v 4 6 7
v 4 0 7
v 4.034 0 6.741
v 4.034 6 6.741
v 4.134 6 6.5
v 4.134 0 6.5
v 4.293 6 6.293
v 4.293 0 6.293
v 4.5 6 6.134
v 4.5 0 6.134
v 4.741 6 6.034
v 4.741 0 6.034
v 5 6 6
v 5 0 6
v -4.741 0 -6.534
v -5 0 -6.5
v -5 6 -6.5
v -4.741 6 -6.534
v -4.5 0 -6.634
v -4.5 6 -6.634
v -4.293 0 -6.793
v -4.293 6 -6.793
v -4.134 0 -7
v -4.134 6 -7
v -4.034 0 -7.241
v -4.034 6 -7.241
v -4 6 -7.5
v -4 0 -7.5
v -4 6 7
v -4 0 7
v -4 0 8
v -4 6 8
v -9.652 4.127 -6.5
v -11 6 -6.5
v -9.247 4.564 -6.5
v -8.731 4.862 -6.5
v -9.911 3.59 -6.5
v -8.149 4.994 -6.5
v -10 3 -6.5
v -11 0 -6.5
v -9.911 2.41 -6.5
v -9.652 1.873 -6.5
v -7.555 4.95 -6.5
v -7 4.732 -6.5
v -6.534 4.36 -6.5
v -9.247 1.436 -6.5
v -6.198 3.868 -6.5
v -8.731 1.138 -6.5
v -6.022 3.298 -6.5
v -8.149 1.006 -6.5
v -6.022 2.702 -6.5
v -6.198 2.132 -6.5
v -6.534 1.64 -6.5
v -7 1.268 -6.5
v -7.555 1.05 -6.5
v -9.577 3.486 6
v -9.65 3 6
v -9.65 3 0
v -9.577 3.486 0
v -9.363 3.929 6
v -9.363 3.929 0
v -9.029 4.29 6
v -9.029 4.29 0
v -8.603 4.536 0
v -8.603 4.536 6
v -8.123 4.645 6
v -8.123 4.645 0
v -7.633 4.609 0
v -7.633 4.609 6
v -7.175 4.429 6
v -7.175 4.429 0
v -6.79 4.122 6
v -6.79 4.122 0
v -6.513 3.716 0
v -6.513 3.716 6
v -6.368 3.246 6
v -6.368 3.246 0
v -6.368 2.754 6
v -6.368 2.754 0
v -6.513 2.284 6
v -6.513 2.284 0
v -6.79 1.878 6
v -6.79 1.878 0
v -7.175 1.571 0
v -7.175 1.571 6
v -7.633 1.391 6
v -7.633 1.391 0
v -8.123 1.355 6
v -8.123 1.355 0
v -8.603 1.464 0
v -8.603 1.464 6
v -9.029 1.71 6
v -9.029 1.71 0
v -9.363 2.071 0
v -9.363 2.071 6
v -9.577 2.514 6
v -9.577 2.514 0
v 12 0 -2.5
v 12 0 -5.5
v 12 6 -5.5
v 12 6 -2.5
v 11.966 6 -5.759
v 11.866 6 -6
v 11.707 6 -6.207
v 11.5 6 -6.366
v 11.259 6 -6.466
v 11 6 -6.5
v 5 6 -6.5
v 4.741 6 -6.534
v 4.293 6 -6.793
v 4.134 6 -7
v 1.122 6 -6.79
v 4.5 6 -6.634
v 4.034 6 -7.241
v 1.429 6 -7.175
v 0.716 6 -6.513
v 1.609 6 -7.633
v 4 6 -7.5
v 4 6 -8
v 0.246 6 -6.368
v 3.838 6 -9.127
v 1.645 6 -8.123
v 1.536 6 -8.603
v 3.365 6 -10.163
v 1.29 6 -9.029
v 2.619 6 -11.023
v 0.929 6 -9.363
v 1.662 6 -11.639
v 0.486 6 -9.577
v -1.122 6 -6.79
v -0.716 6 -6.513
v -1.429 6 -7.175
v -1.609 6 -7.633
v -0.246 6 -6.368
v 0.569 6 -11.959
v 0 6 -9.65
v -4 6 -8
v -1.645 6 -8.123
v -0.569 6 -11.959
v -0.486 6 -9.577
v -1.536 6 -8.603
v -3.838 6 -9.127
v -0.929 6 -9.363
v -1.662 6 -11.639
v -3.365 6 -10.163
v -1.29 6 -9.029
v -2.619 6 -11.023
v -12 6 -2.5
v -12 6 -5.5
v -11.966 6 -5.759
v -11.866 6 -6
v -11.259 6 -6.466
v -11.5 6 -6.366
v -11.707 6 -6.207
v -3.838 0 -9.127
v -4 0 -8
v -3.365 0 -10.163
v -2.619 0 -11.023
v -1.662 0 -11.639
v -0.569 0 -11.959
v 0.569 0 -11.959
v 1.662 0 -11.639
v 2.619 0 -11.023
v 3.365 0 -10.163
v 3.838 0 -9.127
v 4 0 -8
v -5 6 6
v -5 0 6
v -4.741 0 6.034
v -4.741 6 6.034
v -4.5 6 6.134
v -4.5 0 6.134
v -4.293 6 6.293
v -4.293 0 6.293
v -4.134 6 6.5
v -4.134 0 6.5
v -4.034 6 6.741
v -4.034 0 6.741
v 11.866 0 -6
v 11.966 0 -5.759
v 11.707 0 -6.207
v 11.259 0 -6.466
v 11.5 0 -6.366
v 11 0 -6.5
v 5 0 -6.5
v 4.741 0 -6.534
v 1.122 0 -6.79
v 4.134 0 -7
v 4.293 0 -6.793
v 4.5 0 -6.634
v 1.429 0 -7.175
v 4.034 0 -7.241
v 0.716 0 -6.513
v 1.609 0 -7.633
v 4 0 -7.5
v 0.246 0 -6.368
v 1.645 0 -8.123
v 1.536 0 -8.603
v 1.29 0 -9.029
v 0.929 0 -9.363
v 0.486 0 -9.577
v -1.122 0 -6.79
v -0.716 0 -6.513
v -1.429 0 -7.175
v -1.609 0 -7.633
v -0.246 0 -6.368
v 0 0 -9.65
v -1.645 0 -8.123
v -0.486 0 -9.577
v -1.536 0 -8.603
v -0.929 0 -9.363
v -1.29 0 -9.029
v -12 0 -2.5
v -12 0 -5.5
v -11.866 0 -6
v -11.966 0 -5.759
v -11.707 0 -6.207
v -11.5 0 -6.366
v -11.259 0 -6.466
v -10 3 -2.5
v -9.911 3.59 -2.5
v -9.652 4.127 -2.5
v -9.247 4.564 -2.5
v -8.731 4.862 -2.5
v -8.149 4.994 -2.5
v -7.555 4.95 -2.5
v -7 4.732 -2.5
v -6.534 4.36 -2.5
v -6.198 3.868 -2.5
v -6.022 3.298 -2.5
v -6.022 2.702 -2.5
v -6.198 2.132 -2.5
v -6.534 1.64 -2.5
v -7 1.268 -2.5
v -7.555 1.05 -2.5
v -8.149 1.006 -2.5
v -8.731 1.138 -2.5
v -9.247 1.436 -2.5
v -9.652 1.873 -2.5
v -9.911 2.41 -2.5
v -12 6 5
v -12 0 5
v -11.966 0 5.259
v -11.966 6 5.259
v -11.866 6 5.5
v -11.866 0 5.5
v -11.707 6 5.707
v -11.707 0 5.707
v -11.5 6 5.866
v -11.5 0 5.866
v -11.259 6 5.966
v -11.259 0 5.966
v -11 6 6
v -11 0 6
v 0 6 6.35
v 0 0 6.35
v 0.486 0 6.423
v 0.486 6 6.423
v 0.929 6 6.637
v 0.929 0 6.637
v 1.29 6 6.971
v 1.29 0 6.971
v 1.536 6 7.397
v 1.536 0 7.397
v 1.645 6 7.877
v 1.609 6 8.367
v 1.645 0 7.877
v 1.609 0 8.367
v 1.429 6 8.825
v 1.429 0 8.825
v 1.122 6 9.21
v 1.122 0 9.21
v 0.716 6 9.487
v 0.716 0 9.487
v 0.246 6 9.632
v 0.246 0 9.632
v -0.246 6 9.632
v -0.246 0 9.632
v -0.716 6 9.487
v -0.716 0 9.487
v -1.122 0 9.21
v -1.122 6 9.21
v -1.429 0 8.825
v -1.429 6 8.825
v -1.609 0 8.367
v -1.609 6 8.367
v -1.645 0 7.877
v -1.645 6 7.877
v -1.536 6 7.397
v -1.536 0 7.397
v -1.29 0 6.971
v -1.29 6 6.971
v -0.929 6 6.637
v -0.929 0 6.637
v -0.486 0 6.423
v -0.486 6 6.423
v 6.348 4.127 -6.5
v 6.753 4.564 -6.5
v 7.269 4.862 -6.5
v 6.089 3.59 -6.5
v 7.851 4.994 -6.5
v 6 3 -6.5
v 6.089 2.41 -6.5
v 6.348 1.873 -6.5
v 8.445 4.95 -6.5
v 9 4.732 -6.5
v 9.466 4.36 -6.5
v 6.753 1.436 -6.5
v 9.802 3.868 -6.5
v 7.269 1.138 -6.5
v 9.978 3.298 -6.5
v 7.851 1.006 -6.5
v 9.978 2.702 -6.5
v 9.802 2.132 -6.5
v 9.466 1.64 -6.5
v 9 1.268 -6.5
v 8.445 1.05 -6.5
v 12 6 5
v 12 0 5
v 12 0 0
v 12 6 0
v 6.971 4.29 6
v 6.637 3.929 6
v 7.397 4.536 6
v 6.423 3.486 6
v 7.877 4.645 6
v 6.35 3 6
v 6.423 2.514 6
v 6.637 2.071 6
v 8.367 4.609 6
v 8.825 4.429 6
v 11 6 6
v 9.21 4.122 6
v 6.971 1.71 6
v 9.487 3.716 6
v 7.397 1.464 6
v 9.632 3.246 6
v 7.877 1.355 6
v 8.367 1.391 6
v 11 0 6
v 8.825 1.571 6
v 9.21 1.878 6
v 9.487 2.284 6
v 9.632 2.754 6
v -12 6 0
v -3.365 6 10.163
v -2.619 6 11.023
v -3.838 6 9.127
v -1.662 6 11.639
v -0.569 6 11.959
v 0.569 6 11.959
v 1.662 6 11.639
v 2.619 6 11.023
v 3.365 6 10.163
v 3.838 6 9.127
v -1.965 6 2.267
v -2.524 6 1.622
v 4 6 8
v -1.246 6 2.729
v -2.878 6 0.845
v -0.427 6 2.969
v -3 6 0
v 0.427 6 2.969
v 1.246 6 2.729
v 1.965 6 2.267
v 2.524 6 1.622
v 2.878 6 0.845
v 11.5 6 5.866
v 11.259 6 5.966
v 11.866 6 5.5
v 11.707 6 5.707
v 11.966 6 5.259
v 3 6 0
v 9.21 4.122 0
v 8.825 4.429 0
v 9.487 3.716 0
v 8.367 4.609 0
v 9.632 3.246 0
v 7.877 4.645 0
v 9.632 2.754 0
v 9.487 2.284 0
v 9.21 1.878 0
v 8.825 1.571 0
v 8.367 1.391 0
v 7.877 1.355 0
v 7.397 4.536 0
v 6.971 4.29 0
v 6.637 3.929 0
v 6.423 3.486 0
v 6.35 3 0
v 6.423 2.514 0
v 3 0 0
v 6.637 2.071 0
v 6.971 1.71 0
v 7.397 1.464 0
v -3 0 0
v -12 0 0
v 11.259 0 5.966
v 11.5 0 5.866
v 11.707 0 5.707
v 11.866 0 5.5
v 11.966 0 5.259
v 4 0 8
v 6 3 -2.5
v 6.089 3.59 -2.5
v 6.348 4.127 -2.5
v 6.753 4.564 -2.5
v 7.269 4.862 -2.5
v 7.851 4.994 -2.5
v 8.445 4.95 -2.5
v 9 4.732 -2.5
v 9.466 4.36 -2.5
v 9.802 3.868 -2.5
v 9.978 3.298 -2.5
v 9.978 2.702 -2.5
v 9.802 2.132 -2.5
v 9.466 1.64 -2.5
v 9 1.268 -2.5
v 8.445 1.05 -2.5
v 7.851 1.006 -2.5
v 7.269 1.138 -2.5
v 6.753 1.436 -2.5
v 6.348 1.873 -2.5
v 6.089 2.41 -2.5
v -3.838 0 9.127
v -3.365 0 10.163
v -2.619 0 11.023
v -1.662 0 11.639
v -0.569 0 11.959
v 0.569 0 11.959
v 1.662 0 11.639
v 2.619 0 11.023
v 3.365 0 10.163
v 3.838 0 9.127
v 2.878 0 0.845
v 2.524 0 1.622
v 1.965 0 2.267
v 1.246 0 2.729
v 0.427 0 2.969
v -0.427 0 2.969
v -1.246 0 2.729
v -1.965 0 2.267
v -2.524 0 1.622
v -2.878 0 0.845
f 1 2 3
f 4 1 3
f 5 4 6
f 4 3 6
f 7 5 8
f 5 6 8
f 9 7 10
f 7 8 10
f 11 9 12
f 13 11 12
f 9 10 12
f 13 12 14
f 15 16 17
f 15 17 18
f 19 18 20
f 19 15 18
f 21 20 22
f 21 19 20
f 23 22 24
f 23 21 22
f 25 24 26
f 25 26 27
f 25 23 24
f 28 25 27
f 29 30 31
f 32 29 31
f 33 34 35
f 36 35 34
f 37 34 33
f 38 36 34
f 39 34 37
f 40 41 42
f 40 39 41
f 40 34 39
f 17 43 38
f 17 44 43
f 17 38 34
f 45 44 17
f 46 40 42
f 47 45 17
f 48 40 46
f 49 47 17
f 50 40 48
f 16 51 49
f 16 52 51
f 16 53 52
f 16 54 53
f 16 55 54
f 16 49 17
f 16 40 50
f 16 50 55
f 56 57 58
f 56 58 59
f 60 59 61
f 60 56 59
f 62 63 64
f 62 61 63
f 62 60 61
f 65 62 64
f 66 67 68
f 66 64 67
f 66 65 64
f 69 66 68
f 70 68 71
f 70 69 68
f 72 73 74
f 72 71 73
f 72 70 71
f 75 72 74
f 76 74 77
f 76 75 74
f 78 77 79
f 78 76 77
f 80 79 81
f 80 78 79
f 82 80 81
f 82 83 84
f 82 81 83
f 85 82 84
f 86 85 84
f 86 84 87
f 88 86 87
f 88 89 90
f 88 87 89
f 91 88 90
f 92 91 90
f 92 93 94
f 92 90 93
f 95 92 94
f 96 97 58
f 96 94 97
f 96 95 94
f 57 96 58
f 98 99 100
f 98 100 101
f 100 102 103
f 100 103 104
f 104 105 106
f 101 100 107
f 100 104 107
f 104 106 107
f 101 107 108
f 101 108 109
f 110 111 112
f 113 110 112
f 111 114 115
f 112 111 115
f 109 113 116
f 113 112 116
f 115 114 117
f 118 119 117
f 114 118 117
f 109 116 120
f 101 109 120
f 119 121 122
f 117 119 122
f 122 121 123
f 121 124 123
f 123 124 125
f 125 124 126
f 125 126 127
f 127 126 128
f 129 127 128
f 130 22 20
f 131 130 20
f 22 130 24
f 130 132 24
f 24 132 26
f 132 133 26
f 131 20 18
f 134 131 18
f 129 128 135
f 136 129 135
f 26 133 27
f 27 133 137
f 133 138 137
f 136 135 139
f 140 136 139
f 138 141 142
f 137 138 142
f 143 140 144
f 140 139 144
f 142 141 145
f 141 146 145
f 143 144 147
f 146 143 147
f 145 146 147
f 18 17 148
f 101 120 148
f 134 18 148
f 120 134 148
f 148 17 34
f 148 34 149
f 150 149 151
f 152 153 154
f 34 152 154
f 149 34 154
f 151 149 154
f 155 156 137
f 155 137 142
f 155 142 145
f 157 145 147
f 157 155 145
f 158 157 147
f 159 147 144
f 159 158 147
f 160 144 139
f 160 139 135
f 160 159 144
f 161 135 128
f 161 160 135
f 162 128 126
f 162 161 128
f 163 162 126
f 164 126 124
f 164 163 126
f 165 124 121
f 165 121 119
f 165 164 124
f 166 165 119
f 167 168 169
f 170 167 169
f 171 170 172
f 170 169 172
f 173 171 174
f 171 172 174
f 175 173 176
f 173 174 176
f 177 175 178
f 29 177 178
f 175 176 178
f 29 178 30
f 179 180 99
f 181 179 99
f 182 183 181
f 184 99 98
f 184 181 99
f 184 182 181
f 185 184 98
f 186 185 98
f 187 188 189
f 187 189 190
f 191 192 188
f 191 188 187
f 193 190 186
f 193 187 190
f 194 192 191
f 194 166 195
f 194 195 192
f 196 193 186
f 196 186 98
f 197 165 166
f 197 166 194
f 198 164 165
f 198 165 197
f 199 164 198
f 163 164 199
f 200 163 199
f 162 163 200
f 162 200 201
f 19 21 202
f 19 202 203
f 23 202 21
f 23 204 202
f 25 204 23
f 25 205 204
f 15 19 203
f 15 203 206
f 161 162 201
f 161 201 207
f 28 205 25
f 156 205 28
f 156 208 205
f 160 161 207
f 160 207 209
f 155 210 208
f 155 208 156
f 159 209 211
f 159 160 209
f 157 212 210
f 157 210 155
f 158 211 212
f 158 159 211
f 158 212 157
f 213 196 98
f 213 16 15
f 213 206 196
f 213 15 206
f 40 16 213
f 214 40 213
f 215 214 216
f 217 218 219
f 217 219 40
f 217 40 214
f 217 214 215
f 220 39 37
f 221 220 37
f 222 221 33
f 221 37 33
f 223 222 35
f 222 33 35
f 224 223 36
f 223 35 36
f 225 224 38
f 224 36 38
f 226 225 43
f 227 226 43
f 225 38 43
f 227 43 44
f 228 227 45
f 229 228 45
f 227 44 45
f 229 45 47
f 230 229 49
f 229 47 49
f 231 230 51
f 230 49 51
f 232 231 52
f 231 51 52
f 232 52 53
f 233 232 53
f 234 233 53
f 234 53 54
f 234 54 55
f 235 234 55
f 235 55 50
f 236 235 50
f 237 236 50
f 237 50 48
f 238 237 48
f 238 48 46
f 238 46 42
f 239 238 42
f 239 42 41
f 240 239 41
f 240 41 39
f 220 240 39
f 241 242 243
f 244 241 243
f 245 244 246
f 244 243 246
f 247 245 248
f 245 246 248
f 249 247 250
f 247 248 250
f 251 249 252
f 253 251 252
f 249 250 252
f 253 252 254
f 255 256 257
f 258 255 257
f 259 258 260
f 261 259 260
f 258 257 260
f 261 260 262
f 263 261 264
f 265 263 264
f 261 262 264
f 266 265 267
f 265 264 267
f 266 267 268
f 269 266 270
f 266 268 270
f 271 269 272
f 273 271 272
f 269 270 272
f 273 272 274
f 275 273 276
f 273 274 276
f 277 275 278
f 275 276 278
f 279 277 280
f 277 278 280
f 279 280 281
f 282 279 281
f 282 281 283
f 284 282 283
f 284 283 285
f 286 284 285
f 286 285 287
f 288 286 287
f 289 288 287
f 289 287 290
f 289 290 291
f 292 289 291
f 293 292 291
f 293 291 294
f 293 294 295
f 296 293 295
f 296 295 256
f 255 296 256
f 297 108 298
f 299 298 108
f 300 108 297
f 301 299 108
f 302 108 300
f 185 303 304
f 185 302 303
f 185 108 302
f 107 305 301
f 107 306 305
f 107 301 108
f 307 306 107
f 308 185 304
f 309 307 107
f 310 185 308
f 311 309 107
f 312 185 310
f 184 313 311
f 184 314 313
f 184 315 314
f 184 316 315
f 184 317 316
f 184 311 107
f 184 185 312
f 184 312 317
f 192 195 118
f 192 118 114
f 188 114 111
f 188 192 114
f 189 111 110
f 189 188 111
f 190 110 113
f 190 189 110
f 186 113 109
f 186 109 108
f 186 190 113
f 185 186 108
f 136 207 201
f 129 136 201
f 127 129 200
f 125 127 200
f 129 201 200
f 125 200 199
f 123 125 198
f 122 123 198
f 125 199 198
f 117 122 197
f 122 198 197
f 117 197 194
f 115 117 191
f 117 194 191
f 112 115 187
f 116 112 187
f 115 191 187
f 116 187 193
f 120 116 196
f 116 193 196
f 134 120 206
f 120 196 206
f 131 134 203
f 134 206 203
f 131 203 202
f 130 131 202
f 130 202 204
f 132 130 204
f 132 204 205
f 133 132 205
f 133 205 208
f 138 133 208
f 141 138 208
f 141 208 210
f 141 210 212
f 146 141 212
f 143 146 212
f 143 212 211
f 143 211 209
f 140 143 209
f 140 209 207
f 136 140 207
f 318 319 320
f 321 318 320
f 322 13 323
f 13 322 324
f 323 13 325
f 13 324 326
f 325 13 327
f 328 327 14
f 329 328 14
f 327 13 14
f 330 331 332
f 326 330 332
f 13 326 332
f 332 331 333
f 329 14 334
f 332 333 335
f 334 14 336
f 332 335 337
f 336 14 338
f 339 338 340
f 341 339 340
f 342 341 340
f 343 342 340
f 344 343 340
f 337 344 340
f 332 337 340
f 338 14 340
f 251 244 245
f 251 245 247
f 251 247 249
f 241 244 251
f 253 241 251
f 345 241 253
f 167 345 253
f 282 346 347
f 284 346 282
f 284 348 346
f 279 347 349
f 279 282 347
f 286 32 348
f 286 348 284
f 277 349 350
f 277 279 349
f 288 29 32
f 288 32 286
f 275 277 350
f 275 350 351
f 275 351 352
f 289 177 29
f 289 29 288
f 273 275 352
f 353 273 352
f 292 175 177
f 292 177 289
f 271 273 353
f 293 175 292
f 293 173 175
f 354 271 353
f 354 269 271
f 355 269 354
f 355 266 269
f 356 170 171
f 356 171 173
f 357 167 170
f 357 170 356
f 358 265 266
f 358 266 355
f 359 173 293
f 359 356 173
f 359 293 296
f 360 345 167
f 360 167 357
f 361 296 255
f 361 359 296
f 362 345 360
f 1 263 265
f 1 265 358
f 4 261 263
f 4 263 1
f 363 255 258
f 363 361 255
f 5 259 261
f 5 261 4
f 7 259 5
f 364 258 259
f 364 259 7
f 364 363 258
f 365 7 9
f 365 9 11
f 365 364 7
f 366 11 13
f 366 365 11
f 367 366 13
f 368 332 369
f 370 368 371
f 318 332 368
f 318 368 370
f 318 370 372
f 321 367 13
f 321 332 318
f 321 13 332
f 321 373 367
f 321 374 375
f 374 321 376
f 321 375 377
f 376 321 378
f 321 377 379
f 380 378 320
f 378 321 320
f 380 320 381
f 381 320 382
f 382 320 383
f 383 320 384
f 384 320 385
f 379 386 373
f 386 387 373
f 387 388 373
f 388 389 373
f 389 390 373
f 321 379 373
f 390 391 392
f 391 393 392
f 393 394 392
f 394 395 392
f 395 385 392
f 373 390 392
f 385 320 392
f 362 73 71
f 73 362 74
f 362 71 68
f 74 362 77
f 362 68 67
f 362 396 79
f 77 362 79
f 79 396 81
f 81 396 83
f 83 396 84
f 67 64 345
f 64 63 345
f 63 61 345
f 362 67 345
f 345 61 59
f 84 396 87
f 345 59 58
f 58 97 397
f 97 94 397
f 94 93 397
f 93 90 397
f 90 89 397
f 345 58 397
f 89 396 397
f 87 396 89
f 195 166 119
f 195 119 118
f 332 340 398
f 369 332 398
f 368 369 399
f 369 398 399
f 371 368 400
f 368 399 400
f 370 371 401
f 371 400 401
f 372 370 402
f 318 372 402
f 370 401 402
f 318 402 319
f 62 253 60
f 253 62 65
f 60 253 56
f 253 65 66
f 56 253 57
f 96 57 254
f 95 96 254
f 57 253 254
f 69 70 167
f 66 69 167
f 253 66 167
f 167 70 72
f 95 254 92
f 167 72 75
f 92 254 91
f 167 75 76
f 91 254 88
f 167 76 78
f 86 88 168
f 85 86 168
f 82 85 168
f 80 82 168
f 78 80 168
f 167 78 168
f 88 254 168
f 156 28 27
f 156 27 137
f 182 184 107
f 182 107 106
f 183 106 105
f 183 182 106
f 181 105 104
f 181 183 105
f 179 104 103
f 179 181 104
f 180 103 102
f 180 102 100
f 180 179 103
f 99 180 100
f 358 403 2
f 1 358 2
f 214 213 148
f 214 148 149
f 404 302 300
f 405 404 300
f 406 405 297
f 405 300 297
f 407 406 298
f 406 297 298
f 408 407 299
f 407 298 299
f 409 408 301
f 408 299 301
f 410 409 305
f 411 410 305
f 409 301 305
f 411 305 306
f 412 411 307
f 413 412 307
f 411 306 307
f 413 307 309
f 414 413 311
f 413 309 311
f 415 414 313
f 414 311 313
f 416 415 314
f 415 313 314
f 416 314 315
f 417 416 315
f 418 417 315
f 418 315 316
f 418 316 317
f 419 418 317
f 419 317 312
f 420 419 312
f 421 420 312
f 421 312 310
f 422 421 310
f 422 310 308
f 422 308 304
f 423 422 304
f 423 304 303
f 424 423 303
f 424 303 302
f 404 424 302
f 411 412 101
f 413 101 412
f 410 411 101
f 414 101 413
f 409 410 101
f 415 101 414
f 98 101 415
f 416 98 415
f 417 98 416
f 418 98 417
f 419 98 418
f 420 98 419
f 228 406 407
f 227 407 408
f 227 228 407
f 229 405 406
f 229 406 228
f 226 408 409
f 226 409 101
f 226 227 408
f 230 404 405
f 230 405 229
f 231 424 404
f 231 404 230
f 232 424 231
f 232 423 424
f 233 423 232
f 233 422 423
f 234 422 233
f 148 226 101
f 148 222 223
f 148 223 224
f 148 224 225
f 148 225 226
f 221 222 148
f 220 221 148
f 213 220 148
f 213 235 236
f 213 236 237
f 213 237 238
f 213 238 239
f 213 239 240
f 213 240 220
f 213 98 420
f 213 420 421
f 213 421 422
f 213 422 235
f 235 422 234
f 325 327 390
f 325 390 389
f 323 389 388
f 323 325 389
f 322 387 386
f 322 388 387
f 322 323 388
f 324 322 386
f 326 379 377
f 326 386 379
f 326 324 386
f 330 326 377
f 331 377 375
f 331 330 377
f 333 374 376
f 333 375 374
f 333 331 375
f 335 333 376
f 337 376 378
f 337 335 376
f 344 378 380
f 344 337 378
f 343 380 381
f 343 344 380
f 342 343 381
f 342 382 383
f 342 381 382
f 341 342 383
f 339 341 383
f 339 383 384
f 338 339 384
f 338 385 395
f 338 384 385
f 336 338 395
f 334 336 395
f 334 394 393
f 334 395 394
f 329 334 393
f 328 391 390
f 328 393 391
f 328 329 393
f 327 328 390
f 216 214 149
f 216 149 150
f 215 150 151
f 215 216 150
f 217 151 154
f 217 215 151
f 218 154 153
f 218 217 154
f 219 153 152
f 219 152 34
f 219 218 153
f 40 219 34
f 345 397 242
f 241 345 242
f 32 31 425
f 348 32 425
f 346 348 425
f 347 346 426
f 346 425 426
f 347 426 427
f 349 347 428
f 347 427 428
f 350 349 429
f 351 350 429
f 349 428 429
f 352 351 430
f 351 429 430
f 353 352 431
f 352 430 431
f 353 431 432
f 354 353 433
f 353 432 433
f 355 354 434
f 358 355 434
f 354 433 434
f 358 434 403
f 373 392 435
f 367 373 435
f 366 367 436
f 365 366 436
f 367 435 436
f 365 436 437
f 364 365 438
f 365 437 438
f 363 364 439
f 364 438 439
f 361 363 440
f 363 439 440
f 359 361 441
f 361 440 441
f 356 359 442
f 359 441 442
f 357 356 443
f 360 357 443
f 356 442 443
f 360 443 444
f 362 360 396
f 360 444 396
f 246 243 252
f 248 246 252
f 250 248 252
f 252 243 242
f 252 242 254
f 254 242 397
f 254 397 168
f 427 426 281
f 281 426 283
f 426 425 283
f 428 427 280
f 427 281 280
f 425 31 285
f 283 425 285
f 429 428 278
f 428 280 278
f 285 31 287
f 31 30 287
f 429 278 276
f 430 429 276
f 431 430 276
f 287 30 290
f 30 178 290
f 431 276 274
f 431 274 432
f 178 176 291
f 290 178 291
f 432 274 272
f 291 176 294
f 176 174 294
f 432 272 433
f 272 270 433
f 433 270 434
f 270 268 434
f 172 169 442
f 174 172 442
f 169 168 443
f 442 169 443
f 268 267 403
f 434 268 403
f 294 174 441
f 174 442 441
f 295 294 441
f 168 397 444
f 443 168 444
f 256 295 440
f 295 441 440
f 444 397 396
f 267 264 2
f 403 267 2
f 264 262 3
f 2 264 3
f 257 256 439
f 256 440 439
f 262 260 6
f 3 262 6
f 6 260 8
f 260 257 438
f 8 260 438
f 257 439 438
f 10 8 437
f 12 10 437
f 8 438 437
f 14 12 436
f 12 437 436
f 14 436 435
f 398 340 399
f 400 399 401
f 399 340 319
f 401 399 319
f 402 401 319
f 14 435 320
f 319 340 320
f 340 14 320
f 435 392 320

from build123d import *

# Parameters (mm, degrees)
EXTRUDE_1_DEPTH          = 6
EXTRUDE_1_2_DEPTH        = 6
CUT_EXTRUDE_2_DEPTH      = 19
CUT_EXTRUDE_2_DEPTH_BACK = 19
SKETCH_2_R               = 1.65
SKETCH_3_R               = 1.65
CUT_EXTRUDE_3_DEPTH      = 8
SKETCH_4_R               = 2
CUT_EXTRUDE_4_DEPTH      = 5


with BuildPart() as part:
    # 草图1 → 凸台-拉伸1 (new body)
    with BuildSketch(Plane(origin=(0, 0, 0), x_dir=(1, 0, 0), z_dir=(0, 1, 0))):
        with BuildLine():
            Line((-3, 0), (-12, 0))
            Line((-12, 0), (-12, -5))
            ThreePointArc((-12, -5), (-11.707106781, -5.707106781), (-11, -6))
            Line((-11, -6), (-5, -6))
            ThreePointArc((-5, -6), (-4.292893219, -6.292893219), (-4, -7))
            Line((-4, -7), (-4, -8))
            ThreePointArc((-4, -8), (0, -12), (4, -8))
            Line((4, -8), (4, -7))
            ThreePointArc((4, -7), (4.292893219, -6.292893219), (5, -6))
            Line((5, -6), (11, -6))
            ThreePointArc((11, -6), (11.707106781, -5.707106781), (12, -5))
            Line((12, -5), (12, 0))
            Line((12, 0), (3, 0))
            ThreePointArc((3, 0), (0, -3), (-3, 0))
        make_face()
    extrude(amount=EXTRUDE_1_DEPTH)


with BuildPart() as body_2:
    # 草图1 → Extrude 1 2 (new body)
    with BuildSketch(Plane(origin=(0, 0, 0), x_dir=(1, 0, 0), z_dir=(0, 1, 0))):
        with BuildLine():
            Line((12, 2.5), (-12, 2.5))
            Line((-12, 2.5), (-12, 5.5))
            ThreePointArc((-12, 5.5), (-11.707106781, 6.207106781), (-11, 6.5))
            Line((-11, 6.5), (-5, 6.5))
            ThreePointArc((-5, 6.5), (-4.292893219, 6.792893219), (-4, 7.5))
            Line((-4, 7.5), (-4, 8))
            ThreePointArc((-4, 8), (0, 12), (4, 8))
            Line((4, 8), (4, 7.5))
            ThreePointArc((4, 7.5), (4.292893219, 6.792893219), (5, 6.5))
            Line((5, 6.5), (11, 6.5))
            ThreePointArc((11, 6.5), (11.707106781, 6.207106781), (12, 5.5))
            Line((12, 5.5), (12, 2.5))
        make_face()
    extrude(amount=EXTRUDE_1_2_DEPTH)


with BuildPart() as cut_extrude_2_tool:
    # 草图2 → 切除-拉伸2 (new, two sides: drawn at the far end of the back side and taken through both)
    with BuildSketch(Plane(origin=(0, 0, 0), x_dir=(-1, 0, 0), z_dir=(0, 0, -1)).offset(-CUT_EXTRUDE_2_DEPTH_BACK)):
        with Locations((-8, 3)):
            Circle(SKETCH_2_R)
        with Locations((8, 3)):
            Circle(SKETCH_2_R)
    extrude(amount=CUT_EXTRUDE_2_DEPTH + CUT_EXTRUDE_2_DEPTH_BACK)


with BuildPart() as part_1:
    add(part.part)

    # 切除-拉伸2: cut by cut_extrude_2_tool
    add(cut_extrude_2_tool.part, mode=Mode.SUBTRACT)


with BuildPart() as body_2_1:
    add(body_2.part)

    # 切除-拉伸2: cut by cut_extrude_2_tool
    add(cut_extrude_2_tool.part, mode=Mode.SUBTRACT)


with BuildPart() as cut_extrude_3_tool:
    # 草图3 → 切除-拉伸3 (new body)
    with BuildSketch(Plane.XZ):
        with Locations(Location((0, 8, 0), (0, 0, 270))):
            Circle(SKETCH_3_R)
        with Locations(Location((0, -8, 0), (0, 0, 270))):
            Circle(SKETCH_3_R)
    extrude(amount=-CUT_EXTRUDE_3_DEPTH)


with BuildPart() as part_2:
    add(part_1.part)

    # 切除-拉伸3: cut by cut_extrude_3_tool
    add(cut_extrude_3_tool.part, mode=Mode.SUBTRACT)


with BuildPart() as body_2_2:
    add(body_2_1.part)

    # 切除-拉伸3: cut by cut_extrude_3_tool
    add(cut_extrude_3_tool.part, mode=Mode.SUBTRACT)

    # 草图4 → 切除-拉伸4 (cut)
    with BuildSketch(Plane(origin=(0, 0, -6.5), x_dir=(-1, 0, 0), z_dir=(0, 0, -1))):
        with Locations((-8, 3)):
            Circle(SKETCH_4_R)
        with Locations((8, 3)):
            Circle(SKETCH_4_R)
    extrude(amount=-CUT_EXTRUDE_4_DEPTH, mode=Mode.SUBTRACT)


solid = Compound([part_2.part, body_2_2.part])
